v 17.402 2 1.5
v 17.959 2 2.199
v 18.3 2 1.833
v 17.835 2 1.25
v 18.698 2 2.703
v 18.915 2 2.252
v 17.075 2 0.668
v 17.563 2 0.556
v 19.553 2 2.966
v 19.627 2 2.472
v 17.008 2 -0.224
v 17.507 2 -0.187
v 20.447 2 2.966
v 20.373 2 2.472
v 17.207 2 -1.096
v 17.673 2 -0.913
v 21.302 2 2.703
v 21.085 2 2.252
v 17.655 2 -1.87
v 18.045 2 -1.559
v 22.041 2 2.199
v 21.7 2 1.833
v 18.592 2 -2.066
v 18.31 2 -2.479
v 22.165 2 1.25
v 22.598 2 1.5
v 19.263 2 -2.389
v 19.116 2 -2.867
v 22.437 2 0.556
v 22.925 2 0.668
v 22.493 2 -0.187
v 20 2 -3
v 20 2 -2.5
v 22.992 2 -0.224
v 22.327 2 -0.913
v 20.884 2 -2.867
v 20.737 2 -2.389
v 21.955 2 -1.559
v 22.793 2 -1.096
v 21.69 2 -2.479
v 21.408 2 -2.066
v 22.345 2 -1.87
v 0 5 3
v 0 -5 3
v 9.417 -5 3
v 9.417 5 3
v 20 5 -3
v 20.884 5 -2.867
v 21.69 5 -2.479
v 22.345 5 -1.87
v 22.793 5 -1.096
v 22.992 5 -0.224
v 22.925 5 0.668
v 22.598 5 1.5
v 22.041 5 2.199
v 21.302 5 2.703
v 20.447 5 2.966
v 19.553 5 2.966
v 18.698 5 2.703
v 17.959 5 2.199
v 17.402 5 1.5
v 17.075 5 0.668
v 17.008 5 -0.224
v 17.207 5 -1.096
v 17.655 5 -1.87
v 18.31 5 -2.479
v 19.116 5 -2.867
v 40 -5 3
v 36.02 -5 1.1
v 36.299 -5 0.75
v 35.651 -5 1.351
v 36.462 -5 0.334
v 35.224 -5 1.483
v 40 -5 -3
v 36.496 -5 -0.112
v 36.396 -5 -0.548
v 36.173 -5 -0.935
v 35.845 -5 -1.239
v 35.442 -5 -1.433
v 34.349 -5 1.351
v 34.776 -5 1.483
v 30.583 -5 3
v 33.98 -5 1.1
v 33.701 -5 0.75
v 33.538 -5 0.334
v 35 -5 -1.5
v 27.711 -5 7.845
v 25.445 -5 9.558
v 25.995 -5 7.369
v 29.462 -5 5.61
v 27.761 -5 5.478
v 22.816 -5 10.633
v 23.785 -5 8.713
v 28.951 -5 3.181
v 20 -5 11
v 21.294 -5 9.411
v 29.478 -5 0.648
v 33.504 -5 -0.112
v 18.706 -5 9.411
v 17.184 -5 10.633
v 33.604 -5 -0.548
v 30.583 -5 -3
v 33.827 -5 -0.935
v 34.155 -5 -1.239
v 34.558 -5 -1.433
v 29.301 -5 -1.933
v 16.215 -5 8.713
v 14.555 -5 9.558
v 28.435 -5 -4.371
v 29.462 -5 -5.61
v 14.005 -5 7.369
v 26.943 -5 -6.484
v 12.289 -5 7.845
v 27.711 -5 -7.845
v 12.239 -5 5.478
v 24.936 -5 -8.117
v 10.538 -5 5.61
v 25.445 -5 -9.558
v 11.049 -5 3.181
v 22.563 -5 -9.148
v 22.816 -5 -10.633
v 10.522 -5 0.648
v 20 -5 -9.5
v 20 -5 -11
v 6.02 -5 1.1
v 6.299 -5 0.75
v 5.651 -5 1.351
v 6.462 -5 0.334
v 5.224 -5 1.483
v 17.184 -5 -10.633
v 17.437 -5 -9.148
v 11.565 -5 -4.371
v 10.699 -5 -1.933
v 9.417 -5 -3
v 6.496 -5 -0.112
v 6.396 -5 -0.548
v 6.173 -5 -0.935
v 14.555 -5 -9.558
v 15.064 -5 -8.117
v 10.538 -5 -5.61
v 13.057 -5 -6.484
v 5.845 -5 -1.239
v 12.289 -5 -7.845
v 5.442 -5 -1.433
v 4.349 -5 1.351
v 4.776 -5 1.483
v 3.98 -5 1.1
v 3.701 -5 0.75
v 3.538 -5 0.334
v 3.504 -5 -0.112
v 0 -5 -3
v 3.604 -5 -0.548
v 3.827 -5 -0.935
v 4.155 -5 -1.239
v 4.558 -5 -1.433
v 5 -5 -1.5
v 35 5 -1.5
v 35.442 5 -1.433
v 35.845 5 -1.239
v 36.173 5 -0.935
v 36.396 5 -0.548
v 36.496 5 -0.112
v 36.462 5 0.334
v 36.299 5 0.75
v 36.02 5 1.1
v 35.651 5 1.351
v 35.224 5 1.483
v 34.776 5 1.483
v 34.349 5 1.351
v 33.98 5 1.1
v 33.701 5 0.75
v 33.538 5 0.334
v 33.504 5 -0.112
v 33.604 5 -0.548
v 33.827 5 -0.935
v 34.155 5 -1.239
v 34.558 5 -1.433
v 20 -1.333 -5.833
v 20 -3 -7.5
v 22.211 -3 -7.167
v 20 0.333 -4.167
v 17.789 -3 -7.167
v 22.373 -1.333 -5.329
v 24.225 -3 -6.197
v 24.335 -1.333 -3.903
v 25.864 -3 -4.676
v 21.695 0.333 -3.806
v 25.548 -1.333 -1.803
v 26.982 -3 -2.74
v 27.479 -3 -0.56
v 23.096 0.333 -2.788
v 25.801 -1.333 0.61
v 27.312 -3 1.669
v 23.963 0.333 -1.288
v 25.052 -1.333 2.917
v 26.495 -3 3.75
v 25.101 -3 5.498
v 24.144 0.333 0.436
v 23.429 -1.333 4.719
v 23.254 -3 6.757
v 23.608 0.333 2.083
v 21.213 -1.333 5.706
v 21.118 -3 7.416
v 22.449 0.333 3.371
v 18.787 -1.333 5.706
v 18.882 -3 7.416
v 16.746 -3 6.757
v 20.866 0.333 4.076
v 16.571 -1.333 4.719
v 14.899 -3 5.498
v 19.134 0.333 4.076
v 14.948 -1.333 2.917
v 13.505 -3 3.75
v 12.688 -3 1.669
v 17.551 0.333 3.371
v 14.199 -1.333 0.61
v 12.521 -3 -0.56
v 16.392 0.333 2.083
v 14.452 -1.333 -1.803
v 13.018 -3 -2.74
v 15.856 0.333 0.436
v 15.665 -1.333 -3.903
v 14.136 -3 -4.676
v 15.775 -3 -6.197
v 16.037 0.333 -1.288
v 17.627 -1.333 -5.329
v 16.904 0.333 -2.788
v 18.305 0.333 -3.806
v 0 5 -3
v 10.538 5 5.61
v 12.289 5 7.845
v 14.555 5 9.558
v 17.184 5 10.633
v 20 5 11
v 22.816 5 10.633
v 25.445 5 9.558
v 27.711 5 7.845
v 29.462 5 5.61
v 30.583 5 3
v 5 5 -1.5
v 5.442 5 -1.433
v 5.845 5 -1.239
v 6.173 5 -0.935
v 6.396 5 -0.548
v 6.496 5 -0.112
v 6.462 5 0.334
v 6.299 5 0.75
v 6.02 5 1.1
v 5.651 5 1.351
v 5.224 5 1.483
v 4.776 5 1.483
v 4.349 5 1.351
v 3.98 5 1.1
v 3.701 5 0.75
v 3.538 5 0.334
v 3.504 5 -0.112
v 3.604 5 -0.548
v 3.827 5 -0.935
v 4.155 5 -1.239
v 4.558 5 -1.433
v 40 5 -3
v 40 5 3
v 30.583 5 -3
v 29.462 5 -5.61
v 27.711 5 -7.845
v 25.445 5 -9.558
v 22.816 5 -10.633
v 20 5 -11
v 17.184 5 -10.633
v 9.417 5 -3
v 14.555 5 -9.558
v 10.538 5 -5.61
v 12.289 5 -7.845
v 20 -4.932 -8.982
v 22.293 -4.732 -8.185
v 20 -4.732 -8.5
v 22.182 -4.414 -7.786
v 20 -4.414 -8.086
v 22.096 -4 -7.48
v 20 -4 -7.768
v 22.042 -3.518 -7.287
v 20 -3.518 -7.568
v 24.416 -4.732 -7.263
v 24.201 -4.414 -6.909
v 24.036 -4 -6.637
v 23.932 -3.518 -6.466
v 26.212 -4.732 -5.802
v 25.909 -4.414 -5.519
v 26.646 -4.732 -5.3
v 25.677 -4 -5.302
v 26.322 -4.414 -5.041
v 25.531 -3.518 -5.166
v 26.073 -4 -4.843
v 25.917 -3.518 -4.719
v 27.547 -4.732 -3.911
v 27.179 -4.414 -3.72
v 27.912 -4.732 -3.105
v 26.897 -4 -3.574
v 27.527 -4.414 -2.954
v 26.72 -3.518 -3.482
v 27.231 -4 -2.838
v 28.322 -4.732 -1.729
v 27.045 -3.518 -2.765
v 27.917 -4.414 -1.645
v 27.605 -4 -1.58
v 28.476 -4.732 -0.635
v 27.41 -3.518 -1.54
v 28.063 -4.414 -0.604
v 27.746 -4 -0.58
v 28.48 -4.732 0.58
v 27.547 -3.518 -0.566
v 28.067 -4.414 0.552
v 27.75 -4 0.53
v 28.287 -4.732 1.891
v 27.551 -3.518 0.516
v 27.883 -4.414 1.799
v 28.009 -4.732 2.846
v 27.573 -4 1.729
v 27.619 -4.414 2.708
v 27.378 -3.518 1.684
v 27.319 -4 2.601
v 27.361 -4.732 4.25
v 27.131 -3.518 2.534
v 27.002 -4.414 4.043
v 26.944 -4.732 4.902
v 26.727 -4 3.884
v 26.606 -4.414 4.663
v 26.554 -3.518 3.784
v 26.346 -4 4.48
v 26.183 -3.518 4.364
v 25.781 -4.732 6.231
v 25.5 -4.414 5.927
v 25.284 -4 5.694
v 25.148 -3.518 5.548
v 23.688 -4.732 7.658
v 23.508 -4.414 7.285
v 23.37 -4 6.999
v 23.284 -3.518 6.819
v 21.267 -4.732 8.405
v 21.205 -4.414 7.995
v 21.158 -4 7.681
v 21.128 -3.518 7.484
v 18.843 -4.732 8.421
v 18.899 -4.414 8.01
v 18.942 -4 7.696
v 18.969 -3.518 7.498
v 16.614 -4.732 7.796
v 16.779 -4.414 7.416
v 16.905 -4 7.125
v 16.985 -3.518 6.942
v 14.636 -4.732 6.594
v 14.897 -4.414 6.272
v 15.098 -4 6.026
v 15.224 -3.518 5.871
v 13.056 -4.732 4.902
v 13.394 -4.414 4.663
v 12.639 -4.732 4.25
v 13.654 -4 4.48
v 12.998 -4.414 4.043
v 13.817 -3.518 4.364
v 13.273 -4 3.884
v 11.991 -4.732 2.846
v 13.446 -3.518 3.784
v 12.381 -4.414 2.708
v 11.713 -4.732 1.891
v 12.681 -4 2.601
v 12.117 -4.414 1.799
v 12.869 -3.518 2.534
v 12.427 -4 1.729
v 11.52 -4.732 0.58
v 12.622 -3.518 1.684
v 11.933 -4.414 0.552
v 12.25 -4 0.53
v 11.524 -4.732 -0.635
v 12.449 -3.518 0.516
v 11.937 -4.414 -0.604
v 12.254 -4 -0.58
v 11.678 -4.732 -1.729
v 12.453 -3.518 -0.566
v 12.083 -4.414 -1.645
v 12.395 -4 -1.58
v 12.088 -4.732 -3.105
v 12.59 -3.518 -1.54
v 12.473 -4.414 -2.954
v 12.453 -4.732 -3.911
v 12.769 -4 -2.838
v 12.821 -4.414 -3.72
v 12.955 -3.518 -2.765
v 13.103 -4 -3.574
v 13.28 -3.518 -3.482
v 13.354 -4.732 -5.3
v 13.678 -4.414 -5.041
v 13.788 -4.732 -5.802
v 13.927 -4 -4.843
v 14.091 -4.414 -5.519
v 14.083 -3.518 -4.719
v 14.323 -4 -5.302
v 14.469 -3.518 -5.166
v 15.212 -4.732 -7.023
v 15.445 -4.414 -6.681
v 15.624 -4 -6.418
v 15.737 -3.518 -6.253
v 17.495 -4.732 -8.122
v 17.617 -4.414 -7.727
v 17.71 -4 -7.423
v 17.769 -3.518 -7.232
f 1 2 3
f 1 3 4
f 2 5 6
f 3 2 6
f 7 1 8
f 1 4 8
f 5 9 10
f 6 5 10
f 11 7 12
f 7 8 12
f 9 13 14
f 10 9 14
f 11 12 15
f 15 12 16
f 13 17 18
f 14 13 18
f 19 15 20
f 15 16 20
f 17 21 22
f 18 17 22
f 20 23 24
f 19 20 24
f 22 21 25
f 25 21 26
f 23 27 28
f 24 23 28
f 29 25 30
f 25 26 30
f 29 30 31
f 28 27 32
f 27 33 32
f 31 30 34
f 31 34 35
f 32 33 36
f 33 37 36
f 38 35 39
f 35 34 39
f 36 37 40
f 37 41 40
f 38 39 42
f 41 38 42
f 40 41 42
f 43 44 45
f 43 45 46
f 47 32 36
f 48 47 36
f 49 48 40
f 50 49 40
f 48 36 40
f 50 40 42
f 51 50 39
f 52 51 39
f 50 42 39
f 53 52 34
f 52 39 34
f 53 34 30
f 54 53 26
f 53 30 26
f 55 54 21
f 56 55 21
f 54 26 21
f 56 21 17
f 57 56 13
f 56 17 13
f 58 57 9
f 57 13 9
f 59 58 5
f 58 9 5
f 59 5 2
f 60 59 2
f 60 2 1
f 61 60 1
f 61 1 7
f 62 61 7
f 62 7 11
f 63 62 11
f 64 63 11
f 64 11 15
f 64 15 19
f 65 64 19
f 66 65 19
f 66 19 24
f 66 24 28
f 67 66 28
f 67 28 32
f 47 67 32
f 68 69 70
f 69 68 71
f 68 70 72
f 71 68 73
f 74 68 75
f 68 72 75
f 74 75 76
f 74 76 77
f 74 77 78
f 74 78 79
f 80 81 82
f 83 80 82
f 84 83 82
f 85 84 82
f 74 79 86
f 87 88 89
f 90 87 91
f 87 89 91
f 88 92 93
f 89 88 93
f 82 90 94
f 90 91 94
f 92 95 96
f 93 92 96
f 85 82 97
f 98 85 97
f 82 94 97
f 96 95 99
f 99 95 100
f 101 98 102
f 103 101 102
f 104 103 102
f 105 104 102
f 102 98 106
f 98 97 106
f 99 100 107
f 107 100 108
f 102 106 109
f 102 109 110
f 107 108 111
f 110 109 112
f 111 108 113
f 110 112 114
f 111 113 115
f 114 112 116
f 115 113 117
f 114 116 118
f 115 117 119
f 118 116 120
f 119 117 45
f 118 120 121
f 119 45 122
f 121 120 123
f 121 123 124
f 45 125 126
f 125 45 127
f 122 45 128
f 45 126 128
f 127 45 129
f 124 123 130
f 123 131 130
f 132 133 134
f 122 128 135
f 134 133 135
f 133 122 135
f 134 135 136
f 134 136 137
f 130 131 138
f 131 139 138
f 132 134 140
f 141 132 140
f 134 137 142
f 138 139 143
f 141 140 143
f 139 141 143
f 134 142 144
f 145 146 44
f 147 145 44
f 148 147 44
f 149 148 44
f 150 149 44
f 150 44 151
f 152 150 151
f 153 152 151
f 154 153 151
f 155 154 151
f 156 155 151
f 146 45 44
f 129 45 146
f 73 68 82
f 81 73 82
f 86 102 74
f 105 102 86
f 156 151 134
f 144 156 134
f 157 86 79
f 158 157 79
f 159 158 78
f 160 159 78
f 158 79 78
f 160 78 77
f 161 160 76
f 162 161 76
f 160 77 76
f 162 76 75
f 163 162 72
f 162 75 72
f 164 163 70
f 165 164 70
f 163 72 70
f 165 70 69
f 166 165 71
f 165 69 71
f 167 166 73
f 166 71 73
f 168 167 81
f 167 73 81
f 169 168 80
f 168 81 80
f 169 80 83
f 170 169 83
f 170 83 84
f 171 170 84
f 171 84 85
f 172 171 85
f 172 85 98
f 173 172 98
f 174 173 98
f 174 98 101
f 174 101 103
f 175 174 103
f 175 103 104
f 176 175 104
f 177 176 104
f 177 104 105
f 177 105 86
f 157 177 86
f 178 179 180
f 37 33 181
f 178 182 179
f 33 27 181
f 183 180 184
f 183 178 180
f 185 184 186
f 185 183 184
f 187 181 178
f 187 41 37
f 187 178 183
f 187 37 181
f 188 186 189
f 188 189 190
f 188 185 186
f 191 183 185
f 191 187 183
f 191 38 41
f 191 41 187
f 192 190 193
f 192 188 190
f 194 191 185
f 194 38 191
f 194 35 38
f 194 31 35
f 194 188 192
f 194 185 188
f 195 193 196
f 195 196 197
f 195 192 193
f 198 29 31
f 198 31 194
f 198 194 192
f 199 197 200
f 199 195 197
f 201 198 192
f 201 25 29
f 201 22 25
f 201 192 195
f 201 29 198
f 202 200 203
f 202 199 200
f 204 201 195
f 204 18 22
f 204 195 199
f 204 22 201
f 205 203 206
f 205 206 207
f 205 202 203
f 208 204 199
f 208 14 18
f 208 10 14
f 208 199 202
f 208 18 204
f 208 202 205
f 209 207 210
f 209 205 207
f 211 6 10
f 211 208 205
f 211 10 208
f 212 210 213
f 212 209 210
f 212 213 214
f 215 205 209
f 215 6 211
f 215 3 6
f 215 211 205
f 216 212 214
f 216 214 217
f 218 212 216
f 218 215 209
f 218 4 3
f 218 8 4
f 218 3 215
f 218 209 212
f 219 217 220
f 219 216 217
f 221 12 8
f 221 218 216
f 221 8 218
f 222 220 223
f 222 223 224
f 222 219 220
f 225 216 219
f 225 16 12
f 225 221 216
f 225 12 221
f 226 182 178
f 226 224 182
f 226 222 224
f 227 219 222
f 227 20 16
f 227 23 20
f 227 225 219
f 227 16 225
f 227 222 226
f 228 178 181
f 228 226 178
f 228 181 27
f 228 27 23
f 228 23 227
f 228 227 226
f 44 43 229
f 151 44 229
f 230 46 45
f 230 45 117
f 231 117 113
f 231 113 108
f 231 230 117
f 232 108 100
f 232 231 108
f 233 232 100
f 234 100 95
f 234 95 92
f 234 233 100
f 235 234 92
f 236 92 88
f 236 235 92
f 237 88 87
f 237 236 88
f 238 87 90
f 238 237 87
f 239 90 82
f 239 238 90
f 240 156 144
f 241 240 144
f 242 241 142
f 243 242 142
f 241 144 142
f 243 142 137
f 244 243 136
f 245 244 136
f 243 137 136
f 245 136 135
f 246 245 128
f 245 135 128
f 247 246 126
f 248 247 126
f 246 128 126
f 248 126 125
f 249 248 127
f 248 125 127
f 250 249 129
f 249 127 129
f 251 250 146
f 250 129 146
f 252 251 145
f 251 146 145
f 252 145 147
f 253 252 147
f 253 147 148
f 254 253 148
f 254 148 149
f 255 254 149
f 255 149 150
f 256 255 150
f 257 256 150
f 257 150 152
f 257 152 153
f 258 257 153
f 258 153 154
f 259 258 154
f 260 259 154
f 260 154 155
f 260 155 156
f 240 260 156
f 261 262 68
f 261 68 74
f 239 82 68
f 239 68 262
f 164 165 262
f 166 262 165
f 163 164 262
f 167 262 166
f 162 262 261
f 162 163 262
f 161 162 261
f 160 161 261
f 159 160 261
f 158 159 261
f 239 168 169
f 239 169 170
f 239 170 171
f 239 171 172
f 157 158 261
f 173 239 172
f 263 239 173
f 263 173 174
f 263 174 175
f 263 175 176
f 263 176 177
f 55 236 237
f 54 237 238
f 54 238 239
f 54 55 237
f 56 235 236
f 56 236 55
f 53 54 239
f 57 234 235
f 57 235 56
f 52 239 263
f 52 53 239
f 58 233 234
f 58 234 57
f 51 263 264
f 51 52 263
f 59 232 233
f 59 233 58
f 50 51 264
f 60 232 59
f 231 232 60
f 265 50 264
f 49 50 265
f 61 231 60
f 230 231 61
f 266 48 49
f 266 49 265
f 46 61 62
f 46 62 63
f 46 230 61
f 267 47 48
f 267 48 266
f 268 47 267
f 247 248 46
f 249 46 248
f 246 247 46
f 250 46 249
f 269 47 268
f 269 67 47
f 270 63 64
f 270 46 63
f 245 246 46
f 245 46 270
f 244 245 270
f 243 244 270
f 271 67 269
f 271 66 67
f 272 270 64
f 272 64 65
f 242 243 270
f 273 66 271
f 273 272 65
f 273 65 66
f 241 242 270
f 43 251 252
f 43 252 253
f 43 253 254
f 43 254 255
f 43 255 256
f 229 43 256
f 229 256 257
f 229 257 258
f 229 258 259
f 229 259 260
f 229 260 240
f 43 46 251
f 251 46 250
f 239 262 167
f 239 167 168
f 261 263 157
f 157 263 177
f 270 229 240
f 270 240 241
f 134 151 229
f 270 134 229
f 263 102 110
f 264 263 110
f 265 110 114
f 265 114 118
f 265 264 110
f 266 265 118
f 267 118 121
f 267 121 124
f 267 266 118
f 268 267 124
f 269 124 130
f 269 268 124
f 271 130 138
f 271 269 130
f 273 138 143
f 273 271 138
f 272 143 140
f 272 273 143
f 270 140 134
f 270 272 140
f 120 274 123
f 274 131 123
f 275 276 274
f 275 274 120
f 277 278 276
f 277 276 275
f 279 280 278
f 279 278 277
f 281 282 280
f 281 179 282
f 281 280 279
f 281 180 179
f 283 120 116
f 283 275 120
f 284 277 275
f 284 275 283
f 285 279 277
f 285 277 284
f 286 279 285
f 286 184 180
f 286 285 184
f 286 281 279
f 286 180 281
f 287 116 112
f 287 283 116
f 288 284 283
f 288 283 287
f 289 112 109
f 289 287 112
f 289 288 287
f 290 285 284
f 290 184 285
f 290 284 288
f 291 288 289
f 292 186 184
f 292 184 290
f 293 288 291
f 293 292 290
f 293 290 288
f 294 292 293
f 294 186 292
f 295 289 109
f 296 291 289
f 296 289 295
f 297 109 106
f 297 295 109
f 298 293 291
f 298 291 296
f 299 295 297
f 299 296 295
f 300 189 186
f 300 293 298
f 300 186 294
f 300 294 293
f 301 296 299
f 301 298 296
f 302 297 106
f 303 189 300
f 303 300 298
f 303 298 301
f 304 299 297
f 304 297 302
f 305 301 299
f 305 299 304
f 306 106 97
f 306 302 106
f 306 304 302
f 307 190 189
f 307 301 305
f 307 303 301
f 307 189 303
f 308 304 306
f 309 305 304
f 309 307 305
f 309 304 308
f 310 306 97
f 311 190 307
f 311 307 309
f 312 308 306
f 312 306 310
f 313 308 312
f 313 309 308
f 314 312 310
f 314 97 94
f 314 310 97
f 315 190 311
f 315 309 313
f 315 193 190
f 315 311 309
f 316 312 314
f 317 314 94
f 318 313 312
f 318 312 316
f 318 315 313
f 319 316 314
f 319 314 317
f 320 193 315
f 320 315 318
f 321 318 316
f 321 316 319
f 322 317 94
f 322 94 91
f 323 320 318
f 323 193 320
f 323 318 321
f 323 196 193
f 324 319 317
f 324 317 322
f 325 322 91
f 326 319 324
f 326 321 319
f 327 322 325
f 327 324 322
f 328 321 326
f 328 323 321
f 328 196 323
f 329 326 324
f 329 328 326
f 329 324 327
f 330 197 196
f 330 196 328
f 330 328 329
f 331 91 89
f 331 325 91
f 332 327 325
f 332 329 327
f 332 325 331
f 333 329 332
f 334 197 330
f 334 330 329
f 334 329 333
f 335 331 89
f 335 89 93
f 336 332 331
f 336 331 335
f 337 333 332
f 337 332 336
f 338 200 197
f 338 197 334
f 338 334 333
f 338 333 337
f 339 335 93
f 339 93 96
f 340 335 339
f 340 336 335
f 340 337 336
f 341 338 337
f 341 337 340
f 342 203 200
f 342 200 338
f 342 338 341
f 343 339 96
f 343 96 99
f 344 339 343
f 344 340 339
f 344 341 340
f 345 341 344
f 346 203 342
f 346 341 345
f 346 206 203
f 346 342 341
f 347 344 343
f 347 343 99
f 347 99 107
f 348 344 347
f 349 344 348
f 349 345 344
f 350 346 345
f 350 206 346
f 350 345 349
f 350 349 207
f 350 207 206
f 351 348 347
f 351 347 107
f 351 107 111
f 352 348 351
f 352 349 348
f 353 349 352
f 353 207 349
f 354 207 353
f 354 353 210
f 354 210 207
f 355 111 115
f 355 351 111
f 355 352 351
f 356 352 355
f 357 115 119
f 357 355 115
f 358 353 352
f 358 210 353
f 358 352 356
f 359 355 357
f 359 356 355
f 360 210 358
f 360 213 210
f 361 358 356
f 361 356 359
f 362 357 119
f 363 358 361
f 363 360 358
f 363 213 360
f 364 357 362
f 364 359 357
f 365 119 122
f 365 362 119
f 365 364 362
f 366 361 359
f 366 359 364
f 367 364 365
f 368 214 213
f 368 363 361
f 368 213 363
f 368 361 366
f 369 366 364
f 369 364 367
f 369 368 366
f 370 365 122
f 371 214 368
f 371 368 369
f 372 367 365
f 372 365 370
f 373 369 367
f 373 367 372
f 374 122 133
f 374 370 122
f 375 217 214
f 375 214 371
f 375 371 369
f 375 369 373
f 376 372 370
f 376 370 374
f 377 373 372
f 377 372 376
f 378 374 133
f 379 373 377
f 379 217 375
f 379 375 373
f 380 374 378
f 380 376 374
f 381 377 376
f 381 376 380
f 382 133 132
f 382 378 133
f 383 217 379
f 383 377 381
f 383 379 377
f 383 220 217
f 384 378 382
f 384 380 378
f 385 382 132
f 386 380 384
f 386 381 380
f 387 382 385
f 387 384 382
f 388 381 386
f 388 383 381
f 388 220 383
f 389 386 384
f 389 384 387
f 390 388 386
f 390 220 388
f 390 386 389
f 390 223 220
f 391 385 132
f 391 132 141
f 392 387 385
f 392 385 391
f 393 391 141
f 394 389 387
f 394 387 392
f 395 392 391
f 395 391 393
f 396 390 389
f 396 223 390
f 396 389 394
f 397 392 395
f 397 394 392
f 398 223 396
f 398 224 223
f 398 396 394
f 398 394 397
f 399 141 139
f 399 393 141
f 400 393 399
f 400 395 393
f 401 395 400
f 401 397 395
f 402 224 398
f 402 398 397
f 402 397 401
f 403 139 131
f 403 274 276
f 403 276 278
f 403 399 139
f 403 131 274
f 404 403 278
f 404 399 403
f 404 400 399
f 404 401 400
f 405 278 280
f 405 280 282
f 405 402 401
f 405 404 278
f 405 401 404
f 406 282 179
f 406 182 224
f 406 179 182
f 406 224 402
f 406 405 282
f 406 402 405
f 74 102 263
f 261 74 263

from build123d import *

# Parameters (mm, degrees)
SKETCH2_W           = 6
SKETCH2_H           = 10
BOSS_EXTRUDE1_DEPTH = 40
SKETCH3_R           = 11
BOSS_EXTRUDE2_DEPTH = 10
SKETCH4_R           = 7.5
CUT_EXTRUDE1_DEPTH  = 2
SKETCH6_R           = 3
CUT_EXTRUDE2_DEPTH  = 13
FILLET1_R           = 2
CUT_EXTRUDE3_REACH  = 44.673
SKETCH7_R           = 1.5


with BuildPart() as part:
    # Sketch2 → Boss-Extrude1 (new body)
    with BuildSketch(Plane(origin=(0, 0, 0), x_dir=(0, 0, -1), z_dir=(1, 0, 0))):
        Rectangle(SKETCH2_W, SKETCH2_H)
    extrude(amount=BOSS_EXTRUDE1_DEPTH)

    # Sketch3 → Boss-Extrude2 (add)
    with BuildSketch(Plane(origin=(0, 5, 0), x_dir=(1, 0, 0), z_dir=(0, 1, 0))):
        with Locations((20, 0)):
            Circle(SKETCH3_R)
    extrude(amount=-BOSS_EXTRUDE2_DEPTH)

    # Sketch4 → Cut-Extrude1 (cut)
    with BuildSketch(Plane(origin=(0, -5, 0), x_dir=(-1, 0, 0), z_dir=(0, -1, 0))):
        with Locations(Location((-20, 0, 0), (0, 0, 90))):
            Circle(SKETCH4_R)
    extrude(amount=-CUT_EXTRUDE1_DEPTH, mode=Mode.SUBTRACT)

    # Sketch5 → Cut-Revolve1 (revolve, cut)
    with BuildSketch(Plane(origin=(0, 0, 0), x_dir=(-1, 0, 0), z_dir=(0, 0, -1)), mode=Mode.PRIVATE) as cut_revolve1_sk:
        Polygon((-20, -3), (-27.5, -3), (-22.5, 2), (-20, 2), align=None)
    revolve(cut_revolve1_sk.sketch.rotate(Axis((20, 2, 0), (0, -1, 0)), 270), axis=Axis((20, 2, 0), (0, -1, 0)), mode=Mode.SUBTRACT)

    # Sketch6 → Cut-Extrude2 (cut)
    with BuildSketch(Plane.XZ.offset(-2)):
        with Locations(Location((20, 0, 0), (0, 0, 270))):
            Circle(SKETCH6_R)
    extrude(amount=-CUT_EXTRUDE2_DEPTH, mode=Mode.SUBTRACT)

    # Fillet1
    fillet1_edges = [part.edges().sort_by_distance(p)[0] for p in [
        (20, -5, 7.5),
    ]]
    fillet(fillet1_edges, radius=FILLET1_R - 0.0001)  # a hair under: the kernel refuses the full size

    # Sketch7 → Cut-Extrude3 (cut, up to next)
    with BuildSketch(Plane.XZ.offset(5), mode=Mode.PRIVATE) as cut_extrude3_sk1:
        with Locations(Location((5, 0, 0), (0, 0, 270))):
            Circle(SKETCH7_R)
    cut_extrude3_tool1 = extrude(cut_extrude3_sk1.sketch, amount=-CUT_EXTRUDE3_REACH, mode=Mode.PRIVATE) & part.part
    # Sketch7 → Cut-Extrude3 (cut, up to next)
    with BuildSketch(Plane.XZ.offset(5), mode=Mode.PRIVATE) as cut_extrude3_sk2:
        with Locations(Location((35, 0, 0), (0, 0, 270))):
            Circle(SKETCH7_R)
    cut_extrude3_tool2 = extrude(cut_extrude3_sk2.sketch, amount=-CUT_EXTRUDE3_REACH, mode=Mode.PRIVATE) & part.part
    add(cut_extrude3_tool1.solids().sort_by_distance((5, -5, 0))[0], mode=Mode.SUBTRACT)
    add(cut_extrude3_tool2.solids().sort_by_distance((35, -5, 0))[0], mode=Mode.SUBTRACT)


solid = part.part
